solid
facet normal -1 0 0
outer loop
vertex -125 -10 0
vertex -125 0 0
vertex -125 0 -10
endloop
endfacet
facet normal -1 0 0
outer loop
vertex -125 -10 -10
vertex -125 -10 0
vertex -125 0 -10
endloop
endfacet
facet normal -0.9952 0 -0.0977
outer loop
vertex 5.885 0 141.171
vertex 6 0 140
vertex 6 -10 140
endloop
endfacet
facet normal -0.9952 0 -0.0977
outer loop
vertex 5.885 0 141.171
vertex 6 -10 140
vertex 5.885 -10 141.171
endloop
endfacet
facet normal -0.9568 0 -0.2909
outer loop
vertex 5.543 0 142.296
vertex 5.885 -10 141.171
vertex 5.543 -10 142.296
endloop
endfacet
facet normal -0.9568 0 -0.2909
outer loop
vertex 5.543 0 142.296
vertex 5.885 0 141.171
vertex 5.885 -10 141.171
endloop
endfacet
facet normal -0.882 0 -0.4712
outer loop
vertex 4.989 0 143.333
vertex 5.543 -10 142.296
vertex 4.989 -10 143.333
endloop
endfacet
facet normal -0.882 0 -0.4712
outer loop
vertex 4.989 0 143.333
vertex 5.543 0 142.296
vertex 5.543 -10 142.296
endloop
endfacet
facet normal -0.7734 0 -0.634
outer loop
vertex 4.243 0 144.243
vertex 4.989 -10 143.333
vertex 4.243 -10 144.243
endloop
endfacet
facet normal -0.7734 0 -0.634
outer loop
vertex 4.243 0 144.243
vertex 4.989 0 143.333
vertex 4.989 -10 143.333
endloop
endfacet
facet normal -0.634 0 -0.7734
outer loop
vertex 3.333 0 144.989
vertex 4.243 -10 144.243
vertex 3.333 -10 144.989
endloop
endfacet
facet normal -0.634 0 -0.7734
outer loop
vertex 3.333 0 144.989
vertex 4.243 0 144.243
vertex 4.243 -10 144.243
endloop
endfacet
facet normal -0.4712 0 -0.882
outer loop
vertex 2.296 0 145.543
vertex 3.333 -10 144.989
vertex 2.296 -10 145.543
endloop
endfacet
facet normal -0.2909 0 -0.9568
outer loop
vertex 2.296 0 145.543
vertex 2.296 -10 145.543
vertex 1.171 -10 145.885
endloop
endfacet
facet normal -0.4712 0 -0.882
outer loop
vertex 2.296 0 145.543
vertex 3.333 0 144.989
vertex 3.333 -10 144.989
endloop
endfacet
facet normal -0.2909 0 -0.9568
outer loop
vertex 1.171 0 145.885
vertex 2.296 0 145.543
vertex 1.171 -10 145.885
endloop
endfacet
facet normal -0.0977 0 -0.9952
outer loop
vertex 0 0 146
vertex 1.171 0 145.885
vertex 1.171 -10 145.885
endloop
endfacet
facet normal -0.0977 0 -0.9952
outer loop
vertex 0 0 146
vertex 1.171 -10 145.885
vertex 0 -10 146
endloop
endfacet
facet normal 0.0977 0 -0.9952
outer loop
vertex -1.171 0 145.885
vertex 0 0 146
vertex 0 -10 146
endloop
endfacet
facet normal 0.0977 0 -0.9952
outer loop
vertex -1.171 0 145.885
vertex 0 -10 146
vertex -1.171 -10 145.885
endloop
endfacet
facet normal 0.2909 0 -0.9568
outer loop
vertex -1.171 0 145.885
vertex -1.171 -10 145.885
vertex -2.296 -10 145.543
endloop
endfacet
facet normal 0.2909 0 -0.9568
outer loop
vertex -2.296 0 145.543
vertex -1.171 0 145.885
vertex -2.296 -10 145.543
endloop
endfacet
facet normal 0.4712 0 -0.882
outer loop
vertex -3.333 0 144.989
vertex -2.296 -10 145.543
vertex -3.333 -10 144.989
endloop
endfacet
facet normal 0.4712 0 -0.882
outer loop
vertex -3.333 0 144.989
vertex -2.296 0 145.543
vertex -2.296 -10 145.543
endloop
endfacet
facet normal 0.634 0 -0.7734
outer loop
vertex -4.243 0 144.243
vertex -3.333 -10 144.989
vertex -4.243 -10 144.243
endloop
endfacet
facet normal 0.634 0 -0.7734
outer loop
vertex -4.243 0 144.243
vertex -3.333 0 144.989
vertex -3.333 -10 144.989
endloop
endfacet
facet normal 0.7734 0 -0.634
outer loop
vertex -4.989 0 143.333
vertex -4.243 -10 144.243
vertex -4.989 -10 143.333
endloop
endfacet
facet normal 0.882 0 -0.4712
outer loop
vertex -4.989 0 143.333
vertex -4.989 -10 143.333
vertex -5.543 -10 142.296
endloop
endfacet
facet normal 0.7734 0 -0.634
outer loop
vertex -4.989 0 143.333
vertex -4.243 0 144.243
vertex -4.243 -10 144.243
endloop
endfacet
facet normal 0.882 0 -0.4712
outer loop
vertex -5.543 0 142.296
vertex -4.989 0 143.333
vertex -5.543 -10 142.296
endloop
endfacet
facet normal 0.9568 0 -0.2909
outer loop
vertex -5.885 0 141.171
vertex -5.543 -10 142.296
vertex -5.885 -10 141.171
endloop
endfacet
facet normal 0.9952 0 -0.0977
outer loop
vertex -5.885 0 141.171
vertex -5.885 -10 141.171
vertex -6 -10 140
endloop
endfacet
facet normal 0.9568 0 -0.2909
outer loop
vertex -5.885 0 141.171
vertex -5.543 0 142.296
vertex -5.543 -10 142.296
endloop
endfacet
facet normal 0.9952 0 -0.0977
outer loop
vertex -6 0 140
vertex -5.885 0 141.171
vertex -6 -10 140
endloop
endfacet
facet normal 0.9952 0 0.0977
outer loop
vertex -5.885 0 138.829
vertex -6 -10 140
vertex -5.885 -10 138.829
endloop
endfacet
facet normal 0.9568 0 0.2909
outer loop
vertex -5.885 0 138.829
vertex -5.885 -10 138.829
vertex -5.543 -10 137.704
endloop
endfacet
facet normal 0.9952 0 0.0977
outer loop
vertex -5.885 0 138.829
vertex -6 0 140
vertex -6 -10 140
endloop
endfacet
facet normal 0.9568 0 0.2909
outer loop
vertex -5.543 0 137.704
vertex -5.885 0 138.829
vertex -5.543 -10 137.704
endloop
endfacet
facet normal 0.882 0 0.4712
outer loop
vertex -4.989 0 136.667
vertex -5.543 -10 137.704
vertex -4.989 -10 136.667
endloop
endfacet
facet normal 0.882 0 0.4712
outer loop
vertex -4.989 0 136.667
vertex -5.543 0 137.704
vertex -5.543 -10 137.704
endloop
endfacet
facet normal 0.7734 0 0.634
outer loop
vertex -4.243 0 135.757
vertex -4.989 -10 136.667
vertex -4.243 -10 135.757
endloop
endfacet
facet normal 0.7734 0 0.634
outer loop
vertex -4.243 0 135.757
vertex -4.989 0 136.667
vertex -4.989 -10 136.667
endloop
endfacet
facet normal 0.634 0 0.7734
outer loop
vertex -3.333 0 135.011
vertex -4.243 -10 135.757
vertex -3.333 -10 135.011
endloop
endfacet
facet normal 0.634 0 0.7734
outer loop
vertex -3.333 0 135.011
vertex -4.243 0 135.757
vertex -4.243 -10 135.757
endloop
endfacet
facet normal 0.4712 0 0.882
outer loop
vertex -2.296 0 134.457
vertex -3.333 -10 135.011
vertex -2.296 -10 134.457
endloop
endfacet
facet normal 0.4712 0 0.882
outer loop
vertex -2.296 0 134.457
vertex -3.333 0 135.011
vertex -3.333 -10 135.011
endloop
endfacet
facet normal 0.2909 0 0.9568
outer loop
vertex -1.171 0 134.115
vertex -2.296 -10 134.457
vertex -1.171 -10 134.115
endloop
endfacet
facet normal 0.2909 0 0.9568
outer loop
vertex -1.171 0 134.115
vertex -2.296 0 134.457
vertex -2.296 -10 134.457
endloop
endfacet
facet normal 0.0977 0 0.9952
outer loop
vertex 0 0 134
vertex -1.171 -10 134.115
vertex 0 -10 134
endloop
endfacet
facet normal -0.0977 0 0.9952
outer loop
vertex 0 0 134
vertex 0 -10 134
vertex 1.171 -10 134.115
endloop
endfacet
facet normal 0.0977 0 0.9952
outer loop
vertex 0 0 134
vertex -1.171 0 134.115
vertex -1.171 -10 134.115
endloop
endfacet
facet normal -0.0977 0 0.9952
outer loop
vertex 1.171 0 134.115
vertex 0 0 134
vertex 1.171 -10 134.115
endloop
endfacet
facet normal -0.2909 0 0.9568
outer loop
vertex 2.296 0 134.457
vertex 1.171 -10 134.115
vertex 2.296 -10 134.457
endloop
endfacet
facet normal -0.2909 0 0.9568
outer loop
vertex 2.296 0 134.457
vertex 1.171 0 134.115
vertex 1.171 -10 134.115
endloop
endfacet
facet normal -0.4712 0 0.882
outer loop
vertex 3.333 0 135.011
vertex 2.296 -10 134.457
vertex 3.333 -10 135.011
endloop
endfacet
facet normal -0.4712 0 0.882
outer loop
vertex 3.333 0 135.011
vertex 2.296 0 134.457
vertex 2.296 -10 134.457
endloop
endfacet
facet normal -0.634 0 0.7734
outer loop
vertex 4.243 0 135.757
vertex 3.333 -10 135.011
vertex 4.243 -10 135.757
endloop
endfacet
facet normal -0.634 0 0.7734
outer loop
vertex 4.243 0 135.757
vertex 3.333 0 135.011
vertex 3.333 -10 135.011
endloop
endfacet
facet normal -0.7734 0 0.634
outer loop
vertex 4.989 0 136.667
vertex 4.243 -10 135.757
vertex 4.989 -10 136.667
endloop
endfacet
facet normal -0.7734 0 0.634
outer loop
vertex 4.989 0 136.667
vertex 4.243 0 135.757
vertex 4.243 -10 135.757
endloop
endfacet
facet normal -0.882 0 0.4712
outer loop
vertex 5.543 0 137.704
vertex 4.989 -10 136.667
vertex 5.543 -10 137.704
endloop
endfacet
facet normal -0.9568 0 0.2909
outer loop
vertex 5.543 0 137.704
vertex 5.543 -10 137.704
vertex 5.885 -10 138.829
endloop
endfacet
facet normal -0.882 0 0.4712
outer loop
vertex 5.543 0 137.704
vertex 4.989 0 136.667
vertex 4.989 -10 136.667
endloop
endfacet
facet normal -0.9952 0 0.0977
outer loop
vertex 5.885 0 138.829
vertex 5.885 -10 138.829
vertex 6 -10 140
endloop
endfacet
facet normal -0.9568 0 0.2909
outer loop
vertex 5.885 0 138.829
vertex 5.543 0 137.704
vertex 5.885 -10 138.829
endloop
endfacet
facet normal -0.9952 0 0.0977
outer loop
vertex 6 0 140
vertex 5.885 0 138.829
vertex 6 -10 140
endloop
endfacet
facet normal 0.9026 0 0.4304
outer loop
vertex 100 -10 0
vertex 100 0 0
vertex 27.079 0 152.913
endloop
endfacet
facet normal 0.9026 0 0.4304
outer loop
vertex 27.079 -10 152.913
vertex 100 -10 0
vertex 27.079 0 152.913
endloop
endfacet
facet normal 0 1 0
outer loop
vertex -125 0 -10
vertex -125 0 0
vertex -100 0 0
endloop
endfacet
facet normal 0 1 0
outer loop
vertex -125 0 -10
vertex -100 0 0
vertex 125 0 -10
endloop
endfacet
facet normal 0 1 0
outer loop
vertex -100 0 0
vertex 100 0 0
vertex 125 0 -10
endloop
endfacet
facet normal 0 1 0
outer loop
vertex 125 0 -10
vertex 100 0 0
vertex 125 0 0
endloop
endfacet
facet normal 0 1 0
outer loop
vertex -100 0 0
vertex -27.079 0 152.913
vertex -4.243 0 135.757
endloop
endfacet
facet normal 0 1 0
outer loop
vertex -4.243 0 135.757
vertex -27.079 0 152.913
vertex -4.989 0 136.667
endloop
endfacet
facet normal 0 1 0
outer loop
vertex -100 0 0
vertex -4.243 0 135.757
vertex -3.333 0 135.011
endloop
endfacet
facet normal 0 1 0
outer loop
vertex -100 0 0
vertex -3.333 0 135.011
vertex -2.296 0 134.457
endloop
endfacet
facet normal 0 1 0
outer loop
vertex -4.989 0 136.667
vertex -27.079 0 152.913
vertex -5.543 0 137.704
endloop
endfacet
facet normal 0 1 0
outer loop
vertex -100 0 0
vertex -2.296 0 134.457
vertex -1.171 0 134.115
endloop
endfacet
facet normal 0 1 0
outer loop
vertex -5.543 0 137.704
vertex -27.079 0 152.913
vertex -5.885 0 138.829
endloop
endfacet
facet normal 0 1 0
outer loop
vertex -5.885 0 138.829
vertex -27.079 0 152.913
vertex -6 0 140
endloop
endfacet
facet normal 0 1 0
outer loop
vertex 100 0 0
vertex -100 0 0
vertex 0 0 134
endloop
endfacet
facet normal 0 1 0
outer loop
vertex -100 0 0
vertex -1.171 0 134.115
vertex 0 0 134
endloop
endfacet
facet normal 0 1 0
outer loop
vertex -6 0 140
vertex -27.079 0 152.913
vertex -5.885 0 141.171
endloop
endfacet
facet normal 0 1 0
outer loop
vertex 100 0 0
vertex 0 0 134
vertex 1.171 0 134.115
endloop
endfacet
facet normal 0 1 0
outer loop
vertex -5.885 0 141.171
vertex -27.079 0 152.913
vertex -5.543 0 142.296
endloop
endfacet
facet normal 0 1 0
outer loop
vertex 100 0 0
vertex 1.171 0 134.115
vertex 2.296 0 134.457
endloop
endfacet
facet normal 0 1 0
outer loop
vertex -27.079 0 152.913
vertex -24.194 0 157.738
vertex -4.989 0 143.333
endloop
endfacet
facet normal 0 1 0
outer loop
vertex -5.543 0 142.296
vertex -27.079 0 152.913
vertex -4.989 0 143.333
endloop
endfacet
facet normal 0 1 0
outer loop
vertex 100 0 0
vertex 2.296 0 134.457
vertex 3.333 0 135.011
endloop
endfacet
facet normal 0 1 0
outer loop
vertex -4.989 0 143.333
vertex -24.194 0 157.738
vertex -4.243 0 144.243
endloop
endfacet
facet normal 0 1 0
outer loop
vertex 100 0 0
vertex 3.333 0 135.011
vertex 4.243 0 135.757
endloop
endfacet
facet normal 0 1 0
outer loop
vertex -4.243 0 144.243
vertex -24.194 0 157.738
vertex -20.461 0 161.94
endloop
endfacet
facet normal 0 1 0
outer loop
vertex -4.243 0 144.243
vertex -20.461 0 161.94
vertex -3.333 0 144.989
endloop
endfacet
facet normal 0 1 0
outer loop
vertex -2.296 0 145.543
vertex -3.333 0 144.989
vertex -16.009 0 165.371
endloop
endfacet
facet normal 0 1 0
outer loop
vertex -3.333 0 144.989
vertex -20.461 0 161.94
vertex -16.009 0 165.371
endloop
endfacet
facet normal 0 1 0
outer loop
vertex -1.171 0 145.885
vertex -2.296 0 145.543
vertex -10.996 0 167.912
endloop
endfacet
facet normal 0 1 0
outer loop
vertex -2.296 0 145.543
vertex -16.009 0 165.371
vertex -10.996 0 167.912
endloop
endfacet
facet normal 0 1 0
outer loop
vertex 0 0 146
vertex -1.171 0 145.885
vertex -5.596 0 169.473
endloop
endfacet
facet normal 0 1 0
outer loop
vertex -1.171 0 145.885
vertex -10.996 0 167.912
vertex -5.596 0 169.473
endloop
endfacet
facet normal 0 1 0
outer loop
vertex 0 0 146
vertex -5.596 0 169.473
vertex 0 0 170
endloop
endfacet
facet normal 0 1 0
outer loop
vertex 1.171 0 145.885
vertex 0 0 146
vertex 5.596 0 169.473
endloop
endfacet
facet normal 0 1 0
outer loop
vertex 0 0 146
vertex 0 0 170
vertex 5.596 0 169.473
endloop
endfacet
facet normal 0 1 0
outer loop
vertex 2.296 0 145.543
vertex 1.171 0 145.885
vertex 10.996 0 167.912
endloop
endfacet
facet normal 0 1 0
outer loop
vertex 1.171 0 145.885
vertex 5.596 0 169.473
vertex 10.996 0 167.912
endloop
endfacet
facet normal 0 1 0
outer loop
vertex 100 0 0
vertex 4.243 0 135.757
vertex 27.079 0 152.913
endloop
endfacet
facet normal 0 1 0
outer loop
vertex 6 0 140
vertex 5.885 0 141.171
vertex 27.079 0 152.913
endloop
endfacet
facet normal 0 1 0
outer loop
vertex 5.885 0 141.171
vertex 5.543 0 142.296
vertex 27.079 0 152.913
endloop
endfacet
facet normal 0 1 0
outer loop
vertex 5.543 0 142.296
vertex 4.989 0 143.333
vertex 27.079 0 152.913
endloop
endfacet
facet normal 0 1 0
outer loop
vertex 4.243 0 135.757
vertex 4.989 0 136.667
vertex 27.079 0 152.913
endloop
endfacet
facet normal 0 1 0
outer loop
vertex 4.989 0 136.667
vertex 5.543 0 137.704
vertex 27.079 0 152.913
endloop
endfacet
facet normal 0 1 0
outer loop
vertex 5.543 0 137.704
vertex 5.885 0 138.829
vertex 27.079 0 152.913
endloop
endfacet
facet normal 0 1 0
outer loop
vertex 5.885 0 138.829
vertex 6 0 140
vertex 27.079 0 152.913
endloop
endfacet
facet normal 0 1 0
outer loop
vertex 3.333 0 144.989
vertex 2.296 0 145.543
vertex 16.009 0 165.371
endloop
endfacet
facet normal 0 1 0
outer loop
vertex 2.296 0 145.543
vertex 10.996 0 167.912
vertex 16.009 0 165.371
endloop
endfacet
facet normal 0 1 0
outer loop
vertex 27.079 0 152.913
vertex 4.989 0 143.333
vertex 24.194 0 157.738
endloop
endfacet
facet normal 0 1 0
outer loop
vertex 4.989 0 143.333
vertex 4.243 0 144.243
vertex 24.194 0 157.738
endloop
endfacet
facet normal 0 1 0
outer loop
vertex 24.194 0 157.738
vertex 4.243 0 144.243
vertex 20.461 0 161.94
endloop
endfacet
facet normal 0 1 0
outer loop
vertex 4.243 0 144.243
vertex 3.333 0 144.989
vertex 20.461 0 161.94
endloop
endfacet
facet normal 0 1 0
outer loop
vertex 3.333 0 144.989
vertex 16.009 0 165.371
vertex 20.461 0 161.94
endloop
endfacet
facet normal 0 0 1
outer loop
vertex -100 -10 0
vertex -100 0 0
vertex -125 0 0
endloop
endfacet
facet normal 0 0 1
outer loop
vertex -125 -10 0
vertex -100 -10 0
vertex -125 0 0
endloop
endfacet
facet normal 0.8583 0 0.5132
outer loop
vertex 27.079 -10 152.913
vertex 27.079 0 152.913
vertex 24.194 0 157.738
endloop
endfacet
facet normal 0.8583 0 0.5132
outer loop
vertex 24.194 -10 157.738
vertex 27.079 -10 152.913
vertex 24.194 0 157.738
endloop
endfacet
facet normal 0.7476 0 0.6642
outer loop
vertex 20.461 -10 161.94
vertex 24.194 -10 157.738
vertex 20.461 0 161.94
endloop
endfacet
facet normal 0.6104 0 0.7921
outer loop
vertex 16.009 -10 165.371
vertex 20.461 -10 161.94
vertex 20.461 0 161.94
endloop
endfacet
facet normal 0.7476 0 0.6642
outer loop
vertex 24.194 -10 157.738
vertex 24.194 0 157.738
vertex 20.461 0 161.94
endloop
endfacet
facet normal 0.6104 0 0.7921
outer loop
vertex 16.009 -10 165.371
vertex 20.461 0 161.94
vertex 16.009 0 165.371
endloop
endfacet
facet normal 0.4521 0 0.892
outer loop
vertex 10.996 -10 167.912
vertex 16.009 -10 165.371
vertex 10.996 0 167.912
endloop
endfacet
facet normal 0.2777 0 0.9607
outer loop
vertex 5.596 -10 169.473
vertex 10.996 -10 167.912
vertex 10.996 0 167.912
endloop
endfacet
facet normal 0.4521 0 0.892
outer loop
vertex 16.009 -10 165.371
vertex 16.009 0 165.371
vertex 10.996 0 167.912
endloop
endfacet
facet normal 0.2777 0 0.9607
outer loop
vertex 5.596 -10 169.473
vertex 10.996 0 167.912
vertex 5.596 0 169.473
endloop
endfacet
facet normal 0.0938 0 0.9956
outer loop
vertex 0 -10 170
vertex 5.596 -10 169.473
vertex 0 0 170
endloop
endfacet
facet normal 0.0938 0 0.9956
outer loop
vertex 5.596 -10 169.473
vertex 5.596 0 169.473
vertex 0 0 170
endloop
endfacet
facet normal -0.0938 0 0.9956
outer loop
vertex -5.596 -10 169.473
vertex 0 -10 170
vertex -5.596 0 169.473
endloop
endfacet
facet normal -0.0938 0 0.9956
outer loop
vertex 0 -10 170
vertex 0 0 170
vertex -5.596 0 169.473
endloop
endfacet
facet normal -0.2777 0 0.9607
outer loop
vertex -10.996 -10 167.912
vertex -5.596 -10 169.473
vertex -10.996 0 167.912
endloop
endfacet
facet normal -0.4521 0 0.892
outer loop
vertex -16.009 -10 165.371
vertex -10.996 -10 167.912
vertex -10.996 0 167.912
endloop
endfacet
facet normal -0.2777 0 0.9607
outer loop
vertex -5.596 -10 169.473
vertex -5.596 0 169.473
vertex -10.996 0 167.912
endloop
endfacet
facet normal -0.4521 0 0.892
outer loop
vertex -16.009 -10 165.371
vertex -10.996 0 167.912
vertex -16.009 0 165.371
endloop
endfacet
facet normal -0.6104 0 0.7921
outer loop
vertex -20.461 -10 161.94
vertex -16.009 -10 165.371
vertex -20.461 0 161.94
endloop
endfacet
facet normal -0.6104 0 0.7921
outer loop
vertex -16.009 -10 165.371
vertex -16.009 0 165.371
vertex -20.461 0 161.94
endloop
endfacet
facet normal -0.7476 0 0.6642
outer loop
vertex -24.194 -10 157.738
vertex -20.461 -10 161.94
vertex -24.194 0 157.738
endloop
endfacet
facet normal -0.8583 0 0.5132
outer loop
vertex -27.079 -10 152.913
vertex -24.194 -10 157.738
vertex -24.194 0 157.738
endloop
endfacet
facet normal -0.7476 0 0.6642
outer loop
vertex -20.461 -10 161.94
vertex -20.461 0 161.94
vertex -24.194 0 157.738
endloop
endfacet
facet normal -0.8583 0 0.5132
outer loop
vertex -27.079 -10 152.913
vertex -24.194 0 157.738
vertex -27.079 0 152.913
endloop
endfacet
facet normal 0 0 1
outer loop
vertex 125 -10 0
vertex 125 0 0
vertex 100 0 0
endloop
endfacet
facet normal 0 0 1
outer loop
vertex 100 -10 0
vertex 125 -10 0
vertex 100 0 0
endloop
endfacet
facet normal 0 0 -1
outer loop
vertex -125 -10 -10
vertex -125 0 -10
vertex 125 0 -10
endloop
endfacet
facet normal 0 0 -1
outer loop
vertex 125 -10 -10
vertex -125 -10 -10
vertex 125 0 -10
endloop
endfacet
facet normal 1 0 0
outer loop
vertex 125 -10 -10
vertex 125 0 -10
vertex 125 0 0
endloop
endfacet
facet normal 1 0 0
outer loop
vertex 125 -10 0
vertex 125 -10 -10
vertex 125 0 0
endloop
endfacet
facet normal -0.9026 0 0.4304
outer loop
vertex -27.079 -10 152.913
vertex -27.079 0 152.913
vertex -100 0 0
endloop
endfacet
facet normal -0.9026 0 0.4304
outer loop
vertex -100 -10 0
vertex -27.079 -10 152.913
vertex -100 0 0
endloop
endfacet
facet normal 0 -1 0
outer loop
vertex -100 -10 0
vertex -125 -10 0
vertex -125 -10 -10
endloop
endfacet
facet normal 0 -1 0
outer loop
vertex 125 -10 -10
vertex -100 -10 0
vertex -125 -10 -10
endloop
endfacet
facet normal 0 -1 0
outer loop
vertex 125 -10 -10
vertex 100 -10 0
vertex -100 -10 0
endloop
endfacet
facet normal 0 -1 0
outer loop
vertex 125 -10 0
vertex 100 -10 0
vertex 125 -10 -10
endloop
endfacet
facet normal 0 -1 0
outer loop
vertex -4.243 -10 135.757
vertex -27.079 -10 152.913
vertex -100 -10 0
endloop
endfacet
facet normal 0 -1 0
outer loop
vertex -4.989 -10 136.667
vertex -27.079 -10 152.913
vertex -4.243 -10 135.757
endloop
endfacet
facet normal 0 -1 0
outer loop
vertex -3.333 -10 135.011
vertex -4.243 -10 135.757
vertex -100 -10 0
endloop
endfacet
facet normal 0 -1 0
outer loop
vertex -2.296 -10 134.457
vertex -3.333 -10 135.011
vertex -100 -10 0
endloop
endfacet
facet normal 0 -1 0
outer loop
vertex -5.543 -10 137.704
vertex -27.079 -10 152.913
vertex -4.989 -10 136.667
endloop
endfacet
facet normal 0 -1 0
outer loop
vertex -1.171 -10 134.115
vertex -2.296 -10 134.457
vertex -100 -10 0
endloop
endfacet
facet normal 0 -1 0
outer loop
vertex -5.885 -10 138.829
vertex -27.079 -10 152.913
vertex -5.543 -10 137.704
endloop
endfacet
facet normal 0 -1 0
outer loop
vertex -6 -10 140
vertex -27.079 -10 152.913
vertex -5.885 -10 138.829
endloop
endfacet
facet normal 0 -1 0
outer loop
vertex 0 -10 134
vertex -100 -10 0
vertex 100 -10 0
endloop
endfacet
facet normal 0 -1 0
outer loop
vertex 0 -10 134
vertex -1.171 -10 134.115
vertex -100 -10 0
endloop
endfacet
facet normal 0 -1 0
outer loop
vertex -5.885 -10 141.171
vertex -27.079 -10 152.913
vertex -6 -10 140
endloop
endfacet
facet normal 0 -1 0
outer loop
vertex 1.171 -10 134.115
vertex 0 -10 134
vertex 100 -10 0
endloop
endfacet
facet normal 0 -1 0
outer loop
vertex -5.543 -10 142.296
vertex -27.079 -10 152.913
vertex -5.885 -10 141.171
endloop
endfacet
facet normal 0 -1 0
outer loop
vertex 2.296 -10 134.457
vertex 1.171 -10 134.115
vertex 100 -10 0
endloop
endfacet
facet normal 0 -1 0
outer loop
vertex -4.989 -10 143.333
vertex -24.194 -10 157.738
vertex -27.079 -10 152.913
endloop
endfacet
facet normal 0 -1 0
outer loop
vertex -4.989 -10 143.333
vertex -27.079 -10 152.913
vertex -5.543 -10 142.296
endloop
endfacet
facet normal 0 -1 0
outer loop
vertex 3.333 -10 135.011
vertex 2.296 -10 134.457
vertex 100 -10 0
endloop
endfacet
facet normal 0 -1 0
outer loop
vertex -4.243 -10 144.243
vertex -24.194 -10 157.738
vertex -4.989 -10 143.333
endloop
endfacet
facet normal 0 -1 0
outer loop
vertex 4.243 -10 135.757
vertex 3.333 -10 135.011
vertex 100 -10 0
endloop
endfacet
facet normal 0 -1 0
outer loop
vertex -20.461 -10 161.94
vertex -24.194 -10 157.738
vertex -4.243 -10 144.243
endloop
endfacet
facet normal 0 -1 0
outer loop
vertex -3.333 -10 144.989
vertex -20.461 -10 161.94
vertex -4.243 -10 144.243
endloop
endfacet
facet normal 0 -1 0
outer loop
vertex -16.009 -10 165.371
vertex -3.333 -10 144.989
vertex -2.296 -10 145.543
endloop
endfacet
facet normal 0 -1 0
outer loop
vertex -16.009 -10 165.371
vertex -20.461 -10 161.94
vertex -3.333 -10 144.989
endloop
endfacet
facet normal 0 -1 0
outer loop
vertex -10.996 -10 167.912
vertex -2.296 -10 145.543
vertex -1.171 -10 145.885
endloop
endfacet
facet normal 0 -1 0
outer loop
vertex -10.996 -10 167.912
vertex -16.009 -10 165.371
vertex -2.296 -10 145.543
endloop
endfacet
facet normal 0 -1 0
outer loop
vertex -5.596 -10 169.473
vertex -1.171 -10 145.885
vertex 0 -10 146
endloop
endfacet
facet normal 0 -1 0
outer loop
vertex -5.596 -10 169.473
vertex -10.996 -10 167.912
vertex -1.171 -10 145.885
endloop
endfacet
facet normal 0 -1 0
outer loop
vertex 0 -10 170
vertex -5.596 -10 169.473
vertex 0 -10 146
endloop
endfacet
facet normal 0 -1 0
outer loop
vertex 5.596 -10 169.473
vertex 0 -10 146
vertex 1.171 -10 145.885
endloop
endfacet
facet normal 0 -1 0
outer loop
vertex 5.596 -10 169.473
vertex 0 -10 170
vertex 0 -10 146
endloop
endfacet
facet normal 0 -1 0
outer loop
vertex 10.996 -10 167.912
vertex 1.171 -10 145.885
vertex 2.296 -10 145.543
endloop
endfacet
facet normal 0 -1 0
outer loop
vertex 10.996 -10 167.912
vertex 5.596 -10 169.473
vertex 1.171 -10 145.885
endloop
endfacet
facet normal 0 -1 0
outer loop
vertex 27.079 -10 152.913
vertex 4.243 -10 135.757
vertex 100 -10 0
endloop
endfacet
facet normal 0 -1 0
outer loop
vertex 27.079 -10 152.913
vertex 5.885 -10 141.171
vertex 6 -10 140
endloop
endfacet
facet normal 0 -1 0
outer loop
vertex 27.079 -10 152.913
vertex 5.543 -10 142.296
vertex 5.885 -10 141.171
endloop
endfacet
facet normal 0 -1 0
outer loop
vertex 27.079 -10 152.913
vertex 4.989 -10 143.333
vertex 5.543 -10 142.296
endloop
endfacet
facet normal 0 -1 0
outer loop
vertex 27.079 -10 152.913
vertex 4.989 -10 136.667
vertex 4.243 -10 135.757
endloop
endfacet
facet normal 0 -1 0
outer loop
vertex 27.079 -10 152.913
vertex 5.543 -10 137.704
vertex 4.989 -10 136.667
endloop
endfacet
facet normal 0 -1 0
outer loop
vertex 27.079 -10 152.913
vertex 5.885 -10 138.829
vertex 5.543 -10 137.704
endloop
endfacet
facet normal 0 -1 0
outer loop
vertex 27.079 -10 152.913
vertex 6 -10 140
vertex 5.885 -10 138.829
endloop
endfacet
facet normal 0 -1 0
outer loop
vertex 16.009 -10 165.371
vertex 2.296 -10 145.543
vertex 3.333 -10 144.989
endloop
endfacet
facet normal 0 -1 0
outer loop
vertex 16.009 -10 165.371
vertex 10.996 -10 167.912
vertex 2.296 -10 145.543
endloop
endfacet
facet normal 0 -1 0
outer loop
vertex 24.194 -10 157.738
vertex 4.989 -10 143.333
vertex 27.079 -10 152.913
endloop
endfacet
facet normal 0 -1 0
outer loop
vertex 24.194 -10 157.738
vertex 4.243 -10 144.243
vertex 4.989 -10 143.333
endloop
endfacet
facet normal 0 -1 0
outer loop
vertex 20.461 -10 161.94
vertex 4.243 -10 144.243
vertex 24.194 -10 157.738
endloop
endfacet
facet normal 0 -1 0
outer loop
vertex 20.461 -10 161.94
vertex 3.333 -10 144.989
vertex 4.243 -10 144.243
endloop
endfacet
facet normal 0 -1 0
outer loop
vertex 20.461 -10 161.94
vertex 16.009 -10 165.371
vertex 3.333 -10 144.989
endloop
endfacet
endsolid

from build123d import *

# Parameters (mm, degrees)
F0_R     = 6
F1_DEPTH = 10


with BuildPart() as f1:
    # F0 (on Front) → F1 (new body)
    with BuildSketch(Plane.XZ):
        with BuildLine():
            Line((100, 0), (27.078551, 152.913251))
            ThreePointArc((27.078551, 152.913251), (0, 170), (-27.078551, 152.913251))
            Line((-27.078551, 152.913251), (-100, 0))
            Line((-100, 0), (-125, 0))
            Line((-125, 0), (-125, -10))
            Line((-125, -10), (125, -10))
            Line((125, -10), (125, 0))
            Line((125, 0), (100, 0))
        make_face()
        with Locations((0, 140)):
            Circle(F0_R, mode=Mode.SUBTRACT)
    extrude(amount=F1_DEPTH)


solid = f1.part
